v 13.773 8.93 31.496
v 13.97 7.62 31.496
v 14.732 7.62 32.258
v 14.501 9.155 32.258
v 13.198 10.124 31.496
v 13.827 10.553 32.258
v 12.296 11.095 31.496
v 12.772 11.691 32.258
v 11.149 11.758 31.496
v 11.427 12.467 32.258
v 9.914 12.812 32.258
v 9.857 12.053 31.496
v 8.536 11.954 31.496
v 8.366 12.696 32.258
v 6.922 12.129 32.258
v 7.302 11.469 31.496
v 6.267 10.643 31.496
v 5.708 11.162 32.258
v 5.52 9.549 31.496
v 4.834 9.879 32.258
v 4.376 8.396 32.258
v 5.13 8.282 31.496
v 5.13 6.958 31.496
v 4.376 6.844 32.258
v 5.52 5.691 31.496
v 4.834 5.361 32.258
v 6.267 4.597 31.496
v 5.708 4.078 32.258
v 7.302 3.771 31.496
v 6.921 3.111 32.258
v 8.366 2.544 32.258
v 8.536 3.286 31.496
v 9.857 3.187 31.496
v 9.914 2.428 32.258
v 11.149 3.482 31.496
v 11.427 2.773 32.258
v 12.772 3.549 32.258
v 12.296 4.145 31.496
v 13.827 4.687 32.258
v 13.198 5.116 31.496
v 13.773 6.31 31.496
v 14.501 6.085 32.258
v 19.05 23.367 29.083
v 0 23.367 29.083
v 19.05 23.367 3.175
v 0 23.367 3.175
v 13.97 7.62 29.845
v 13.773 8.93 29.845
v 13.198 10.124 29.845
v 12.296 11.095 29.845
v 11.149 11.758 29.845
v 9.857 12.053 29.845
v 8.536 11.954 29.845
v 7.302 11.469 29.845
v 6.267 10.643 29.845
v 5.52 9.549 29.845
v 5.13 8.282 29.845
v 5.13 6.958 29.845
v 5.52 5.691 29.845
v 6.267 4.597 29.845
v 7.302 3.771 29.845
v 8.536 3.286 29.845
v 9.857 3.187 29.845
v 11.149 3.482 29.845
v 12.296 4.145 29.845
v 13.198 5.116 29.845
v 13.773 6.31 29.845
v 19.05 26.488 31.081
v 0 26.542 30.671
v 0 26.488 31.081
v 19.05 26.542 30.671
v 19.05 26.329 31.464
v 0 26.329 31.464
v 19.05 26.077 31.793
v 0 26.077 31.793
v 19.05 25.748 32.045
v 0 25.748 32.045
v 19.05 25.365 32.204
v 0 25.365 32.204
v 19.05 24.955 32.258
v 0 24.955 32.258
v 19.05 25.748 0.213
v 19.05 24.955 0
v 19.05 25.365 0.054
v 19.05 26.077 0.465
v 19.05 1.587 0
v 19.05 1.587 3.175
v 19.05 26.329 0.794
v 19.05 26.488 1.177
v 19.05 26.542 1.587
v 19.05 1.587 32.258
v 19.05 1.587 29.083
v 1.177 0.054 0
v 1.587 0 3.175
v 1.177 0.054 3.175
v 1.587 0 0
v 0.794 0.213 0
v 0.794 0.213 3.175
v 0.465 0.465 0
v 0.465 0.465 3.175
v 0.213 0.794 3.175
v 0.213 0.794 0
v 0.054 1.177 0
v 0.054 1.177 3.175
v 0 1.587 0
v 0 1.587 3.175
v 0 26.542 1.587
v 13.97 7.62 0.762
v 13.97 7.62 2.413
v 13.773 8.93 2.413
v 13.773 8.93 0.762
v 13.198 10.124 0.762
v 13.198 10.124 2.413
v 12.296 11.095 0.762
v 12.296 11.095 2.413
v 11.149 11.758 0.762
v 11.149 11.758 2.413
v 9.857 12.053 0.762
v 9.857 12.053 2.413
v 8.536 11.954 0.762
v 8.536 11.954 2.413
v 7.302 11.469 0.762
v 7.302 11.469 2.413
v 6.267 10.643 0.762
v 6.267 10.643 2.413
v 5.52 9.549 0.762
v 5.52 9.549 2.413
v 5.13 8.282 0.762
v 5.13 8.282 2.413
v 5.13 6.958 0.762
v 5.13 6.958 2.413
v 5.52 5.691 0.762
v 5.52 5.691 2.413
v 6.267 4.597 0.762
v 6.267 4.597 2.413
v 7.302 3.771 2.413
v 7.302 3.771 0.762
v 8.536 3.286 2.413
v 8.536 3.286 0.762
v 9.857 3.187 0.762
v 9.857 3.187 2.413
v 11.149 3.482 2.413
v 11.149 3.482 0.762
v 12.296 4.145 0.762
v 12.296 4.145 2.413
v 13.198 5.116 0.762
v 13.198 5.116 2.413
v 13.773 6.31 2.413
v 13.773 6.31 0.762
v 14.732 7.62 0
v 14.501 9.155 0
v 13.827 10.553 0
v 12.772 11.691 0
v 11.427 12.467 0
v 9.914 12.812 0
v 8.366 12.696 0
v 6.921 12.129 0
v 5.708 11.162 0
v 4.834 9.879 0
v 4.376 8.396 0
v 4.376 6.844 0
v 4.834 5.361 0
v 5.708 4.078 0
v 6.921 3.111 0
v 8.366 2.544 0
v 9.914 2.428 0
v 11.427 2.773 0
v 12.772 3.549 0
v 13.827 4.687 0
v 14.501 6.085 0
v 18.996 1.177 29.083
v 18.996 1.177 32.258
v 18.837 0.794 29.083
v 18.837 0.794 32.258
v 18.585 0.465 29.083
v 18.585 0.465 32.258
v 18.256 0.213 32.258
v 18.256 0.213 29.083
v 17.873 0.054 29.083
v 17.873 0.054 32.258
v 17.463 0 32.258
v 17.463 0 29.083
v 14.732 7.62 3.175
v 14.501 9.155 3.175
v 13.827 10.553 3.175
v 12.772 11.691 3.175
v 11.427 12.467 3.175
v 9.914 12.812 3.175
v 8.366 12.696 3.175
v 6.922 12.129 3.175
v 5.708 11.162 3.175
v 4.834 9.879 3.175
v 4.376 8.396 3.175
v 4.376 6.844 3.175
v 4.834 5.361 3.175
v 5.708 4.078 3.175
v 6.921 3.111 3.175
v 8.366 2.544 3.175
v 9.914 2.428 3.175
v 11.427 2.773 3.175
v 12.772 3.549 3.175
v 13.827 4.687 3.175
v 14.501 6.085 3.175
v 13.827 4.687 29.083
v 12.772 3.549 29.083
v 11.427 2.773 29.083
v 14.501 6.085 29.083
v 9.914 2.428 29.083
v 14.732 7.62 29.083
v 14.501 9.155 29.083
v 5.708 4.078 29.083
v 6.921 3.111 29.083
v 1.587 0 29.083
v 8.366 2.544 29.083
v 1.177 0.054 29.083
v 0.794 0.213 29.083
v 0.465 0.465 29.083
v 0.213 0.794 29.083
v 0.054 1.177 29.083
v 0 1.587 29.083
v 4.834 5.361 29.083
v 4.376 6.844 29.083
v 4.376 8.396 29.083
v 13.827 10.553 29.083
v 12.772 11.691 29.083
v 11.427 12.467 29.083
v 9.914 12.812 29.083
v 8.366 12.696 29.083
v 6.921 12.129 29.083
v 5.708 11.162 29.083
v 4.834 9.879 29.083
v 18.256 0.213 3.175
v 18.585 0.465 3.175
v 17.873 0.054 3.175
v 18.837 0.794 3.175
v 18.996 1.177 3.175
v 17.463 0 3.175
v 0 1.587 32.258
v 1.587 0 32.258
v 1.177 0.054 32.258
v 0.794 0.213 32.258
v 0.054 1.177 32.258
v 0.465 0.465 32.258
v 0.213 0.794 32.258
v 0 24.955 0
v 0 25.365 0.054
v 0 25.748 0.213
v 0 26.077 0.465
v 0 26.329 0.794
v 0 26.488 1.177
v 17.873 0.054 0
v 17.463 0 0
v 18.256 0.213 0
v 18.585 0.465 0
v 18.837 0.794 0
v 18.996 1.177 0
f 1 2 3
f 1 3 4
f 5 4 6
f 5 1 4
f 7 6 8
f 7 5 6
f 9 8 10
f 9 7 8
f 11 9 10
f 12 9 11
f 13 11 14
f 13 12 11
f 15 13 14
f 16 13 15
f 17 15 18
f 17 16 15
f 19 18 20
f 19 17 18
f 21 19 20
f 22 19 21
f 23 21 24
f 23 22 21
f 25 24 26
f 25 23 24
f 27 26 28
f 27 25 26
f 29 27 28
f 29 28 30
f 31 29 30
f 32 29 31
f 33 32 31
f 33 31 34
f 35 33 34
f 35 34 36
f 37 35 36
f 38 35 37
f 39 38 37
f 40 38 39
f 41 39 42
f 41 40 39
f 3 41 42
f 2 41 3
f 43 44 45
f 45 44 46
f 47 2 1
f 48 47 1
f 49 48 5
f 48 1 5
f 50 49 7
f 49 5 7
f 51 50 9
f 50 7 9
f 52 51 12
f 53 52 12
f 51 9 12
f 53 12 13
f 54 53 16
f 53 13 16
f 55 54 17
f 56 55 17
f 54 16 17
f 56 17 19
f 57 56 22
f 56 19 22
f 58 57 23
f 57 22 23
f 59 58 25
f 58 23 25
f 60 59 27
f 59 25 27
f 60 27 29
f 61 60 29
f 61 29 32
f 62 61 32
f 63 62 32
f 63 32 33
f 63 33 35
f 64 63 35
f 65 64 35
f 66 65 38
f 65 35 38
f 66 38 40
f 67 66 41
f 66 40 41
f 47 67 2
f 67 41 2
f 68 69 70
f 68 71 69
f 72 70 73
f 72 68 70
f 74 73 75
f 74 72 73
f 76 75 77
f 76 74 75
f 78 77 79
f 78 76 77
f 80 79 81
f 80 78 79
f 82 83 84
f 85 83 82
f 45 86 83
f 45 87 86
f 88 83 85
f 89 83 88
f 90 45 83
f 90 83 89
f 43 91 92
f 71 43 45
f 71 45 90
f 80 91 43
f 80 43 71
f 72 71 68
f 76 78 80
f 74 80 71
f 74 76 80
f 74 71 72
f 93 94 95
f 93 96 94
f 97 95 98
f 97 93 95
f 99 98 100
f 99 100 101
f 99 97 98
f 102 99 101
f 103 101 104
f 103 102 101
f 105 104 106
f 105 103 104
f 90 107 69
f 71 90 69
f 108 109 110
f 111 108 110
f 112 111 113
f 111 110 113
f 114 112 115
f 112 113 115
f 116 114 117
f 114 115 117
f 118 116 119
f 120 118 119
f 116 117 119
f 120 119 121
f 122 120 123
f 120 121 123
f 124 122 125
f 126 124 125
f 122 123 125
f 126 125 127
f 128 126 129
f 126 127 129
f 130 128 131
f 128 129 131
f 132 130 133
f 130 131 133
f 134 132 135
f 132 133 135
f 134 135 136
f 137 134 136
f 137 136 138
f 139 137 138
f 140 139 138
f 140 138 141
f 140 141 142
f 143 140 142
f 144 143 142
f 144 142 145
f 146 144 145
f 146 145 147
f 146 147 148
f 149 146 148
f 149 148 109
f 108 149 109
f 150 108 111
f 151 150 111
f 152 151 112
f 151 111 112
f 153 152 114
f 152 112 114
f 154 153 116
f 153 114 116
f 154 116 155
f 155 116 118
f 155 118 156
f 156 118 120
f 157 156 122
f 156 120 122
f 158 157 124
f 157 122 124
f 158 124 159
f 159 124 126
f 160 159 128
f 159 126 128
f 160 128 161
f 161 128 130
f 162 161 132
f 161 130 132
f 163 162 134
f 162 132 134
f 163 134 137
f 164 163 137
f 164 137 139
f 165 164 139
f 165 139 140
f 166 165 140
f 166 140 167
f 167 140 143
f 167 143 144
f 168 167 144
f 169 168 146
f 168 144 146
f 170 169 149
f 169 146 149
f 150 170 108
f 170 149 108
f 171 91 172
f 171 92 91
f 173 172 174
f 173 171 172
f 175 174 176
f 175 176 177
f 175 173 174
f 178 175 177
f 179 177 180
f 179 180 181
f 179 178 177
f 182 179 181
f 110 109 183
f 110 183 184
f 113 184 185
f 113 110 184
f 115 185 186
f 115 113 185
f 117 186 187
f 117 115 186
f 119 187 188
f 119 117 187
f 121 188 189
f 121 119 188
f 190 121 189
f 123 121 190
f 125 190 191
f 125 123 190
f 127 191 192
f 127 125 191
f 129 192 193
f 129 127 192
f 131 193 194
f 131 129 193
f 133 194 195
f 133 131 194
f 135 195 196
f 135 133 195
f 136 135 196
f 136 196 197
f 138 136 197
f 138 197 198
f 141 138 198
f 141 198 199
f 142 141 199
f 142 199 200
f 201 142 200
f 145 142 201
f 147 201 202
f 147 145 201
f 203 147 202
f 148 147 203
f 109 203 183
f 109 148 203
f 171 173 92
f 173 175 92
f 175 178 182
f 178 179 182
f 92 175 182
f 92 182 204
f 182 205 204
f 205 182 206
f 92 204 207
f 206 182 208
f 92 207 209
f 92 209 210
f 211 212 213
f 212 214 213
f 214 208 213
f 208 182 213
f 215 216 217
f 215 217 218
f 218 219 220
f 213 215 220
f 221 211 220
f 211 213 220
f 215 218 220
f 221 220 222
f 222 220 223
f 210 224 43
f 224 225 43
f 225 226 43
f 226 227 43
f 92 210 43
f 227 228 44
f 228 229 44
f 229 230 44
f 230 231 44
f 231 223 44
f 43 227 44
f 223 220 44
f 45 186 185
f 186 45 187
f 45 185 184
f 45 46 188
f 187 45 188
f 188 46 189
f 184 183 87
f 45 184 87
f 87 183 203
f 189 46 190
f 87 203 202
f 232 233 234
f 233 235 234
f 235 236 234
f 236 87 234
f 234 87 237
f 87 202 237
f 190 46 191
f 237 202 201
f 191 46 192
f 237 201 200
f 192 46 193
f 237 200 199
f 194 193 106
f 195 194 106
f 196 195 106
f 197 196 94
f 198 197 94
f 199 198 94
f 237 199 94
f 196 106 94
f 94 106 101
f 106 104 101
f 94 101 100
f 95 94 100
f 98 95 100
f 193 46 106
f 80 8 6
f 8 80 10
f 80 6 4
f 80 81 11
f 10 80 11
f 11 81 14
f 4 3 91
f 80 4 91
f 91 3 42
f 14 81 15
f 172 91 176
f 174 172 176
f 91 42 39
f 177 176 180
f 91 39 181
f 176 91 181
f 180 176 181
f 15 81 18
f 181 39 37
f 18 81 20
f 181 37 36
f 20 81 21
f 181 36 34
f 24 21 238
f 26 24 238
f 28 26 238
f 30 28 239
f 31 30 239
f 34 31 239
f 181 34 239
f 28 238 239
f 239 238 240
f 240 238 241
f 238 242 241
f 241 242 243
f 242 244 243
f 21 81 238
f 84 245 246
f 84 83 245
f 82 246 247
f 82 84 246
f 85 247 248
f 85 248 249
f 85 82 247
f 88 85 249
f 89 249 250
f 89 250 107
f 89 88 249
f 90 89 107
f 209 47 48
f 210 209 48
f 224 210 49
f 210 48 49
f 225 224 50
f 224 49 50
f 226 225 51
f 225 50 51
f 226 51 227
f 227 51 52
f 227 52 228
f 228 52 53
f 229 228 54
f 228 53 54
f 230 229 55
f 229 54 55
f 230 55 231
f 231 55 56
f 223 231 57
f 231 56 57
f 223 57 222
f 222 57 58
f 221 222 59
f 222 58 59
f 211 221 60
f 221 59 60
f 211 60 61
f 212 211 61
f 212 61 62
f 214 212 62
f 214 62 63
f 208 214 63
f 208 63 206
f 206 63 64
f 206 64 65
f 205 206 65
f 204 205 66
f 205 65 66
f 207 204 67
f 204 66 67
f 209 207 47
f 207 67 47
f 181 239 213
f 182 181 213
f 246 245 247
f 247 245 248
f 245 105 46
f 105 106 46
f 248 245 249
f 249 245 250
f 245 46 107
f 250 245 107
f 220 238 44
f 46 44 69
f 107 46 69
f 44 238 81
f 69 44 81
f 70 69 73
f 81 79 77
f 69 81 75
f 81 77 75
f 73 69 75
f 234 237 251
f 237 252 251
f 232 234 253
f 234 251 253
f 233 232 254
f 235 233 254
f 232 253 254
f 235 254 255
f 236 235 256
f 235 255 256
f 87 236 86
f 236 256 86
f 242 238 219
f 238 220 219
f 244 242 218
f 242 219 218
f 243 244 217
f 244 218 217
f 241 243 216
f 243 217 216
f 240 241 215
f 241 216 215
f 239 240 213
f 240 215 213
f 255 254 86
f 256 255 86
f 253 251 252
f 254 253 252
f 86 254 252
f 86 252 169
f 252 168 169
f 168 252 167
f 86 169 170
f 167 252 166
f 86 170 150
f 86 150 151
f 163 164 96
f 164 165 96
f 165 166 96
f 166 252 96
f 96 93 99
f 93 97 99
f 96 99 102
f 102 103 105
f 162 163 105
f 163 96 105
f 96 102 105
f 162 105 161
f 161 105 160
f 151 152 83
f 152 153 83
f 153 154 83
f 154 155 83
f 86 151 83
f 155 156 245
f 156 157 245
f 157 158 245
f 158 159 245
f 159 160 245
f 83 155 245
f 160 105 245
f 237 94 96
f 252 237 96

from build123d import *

# Parameters (mm, degrees)
F1_DEPTH = 19.05
F2_R     = 4.445
F3_DEPTH = 25.4
F4_R     = 4.445
F5_DEPTH = 3.175
F6_R     = 1.5875
F7_SIZE  = 0.762


with BuildPart() as f1:
    # F0 (on Right) → F1 (new body)
    with BuildSketch(Plane.YZ):
        Polygon((0, 3.175), (0, 0), (26.542, 0), (26.542, 32.258), (0, 32.258), (0, 29.083), (23.367, 29.083), (23.367, 3.175), align=None)
    extrude(amount=F1_DEPTH)

    # F2 (on face) → F3 (cut)
    with BuildSketch(Plane.XY.offset(3.175)):
        with Locations((9.525, 7.62)):
            Circle(F2_R)
    extrude(amount=-F3_DEPTH, mode=Mode.SUBTRACT)

    # F4 (on face) → F5 (cut, through all)
    with BuildSketch(Plane.XY.offset(32.258)):
        with Locations((9.525, 7.62)):
            Circle(F4_R)
    extrude(amount=-F5_DEPTH, mode=Mode.SUBTRACT)

    # F6
    f6_edges = [f1.edges().sort_by_distance(p)[0] for p in [
        (19.05, 0, 30.6705),
        (0, 0, 30.6705),
        (0, 0, 1.5875),
        (19.05, 0, 1.5875),
        (9.525, 26.542, 32.258),
        (9.525, 26.542, 0),
    ]]
    fillet(f6_edges, radius=F6_R)

    # F7
    f7_edges = [f1.edges().sort_by_distance(p)[0] for p in [
        (5.08, 7.62, 0),
        (5.08, 7.62, 29.083),
        (5.08, 7.62, 32.258),
        (5.08, 7.62, 3.175),
    ]]
    chamfer(f7_edges, length=F7_SIZE)


solid = f1.part
